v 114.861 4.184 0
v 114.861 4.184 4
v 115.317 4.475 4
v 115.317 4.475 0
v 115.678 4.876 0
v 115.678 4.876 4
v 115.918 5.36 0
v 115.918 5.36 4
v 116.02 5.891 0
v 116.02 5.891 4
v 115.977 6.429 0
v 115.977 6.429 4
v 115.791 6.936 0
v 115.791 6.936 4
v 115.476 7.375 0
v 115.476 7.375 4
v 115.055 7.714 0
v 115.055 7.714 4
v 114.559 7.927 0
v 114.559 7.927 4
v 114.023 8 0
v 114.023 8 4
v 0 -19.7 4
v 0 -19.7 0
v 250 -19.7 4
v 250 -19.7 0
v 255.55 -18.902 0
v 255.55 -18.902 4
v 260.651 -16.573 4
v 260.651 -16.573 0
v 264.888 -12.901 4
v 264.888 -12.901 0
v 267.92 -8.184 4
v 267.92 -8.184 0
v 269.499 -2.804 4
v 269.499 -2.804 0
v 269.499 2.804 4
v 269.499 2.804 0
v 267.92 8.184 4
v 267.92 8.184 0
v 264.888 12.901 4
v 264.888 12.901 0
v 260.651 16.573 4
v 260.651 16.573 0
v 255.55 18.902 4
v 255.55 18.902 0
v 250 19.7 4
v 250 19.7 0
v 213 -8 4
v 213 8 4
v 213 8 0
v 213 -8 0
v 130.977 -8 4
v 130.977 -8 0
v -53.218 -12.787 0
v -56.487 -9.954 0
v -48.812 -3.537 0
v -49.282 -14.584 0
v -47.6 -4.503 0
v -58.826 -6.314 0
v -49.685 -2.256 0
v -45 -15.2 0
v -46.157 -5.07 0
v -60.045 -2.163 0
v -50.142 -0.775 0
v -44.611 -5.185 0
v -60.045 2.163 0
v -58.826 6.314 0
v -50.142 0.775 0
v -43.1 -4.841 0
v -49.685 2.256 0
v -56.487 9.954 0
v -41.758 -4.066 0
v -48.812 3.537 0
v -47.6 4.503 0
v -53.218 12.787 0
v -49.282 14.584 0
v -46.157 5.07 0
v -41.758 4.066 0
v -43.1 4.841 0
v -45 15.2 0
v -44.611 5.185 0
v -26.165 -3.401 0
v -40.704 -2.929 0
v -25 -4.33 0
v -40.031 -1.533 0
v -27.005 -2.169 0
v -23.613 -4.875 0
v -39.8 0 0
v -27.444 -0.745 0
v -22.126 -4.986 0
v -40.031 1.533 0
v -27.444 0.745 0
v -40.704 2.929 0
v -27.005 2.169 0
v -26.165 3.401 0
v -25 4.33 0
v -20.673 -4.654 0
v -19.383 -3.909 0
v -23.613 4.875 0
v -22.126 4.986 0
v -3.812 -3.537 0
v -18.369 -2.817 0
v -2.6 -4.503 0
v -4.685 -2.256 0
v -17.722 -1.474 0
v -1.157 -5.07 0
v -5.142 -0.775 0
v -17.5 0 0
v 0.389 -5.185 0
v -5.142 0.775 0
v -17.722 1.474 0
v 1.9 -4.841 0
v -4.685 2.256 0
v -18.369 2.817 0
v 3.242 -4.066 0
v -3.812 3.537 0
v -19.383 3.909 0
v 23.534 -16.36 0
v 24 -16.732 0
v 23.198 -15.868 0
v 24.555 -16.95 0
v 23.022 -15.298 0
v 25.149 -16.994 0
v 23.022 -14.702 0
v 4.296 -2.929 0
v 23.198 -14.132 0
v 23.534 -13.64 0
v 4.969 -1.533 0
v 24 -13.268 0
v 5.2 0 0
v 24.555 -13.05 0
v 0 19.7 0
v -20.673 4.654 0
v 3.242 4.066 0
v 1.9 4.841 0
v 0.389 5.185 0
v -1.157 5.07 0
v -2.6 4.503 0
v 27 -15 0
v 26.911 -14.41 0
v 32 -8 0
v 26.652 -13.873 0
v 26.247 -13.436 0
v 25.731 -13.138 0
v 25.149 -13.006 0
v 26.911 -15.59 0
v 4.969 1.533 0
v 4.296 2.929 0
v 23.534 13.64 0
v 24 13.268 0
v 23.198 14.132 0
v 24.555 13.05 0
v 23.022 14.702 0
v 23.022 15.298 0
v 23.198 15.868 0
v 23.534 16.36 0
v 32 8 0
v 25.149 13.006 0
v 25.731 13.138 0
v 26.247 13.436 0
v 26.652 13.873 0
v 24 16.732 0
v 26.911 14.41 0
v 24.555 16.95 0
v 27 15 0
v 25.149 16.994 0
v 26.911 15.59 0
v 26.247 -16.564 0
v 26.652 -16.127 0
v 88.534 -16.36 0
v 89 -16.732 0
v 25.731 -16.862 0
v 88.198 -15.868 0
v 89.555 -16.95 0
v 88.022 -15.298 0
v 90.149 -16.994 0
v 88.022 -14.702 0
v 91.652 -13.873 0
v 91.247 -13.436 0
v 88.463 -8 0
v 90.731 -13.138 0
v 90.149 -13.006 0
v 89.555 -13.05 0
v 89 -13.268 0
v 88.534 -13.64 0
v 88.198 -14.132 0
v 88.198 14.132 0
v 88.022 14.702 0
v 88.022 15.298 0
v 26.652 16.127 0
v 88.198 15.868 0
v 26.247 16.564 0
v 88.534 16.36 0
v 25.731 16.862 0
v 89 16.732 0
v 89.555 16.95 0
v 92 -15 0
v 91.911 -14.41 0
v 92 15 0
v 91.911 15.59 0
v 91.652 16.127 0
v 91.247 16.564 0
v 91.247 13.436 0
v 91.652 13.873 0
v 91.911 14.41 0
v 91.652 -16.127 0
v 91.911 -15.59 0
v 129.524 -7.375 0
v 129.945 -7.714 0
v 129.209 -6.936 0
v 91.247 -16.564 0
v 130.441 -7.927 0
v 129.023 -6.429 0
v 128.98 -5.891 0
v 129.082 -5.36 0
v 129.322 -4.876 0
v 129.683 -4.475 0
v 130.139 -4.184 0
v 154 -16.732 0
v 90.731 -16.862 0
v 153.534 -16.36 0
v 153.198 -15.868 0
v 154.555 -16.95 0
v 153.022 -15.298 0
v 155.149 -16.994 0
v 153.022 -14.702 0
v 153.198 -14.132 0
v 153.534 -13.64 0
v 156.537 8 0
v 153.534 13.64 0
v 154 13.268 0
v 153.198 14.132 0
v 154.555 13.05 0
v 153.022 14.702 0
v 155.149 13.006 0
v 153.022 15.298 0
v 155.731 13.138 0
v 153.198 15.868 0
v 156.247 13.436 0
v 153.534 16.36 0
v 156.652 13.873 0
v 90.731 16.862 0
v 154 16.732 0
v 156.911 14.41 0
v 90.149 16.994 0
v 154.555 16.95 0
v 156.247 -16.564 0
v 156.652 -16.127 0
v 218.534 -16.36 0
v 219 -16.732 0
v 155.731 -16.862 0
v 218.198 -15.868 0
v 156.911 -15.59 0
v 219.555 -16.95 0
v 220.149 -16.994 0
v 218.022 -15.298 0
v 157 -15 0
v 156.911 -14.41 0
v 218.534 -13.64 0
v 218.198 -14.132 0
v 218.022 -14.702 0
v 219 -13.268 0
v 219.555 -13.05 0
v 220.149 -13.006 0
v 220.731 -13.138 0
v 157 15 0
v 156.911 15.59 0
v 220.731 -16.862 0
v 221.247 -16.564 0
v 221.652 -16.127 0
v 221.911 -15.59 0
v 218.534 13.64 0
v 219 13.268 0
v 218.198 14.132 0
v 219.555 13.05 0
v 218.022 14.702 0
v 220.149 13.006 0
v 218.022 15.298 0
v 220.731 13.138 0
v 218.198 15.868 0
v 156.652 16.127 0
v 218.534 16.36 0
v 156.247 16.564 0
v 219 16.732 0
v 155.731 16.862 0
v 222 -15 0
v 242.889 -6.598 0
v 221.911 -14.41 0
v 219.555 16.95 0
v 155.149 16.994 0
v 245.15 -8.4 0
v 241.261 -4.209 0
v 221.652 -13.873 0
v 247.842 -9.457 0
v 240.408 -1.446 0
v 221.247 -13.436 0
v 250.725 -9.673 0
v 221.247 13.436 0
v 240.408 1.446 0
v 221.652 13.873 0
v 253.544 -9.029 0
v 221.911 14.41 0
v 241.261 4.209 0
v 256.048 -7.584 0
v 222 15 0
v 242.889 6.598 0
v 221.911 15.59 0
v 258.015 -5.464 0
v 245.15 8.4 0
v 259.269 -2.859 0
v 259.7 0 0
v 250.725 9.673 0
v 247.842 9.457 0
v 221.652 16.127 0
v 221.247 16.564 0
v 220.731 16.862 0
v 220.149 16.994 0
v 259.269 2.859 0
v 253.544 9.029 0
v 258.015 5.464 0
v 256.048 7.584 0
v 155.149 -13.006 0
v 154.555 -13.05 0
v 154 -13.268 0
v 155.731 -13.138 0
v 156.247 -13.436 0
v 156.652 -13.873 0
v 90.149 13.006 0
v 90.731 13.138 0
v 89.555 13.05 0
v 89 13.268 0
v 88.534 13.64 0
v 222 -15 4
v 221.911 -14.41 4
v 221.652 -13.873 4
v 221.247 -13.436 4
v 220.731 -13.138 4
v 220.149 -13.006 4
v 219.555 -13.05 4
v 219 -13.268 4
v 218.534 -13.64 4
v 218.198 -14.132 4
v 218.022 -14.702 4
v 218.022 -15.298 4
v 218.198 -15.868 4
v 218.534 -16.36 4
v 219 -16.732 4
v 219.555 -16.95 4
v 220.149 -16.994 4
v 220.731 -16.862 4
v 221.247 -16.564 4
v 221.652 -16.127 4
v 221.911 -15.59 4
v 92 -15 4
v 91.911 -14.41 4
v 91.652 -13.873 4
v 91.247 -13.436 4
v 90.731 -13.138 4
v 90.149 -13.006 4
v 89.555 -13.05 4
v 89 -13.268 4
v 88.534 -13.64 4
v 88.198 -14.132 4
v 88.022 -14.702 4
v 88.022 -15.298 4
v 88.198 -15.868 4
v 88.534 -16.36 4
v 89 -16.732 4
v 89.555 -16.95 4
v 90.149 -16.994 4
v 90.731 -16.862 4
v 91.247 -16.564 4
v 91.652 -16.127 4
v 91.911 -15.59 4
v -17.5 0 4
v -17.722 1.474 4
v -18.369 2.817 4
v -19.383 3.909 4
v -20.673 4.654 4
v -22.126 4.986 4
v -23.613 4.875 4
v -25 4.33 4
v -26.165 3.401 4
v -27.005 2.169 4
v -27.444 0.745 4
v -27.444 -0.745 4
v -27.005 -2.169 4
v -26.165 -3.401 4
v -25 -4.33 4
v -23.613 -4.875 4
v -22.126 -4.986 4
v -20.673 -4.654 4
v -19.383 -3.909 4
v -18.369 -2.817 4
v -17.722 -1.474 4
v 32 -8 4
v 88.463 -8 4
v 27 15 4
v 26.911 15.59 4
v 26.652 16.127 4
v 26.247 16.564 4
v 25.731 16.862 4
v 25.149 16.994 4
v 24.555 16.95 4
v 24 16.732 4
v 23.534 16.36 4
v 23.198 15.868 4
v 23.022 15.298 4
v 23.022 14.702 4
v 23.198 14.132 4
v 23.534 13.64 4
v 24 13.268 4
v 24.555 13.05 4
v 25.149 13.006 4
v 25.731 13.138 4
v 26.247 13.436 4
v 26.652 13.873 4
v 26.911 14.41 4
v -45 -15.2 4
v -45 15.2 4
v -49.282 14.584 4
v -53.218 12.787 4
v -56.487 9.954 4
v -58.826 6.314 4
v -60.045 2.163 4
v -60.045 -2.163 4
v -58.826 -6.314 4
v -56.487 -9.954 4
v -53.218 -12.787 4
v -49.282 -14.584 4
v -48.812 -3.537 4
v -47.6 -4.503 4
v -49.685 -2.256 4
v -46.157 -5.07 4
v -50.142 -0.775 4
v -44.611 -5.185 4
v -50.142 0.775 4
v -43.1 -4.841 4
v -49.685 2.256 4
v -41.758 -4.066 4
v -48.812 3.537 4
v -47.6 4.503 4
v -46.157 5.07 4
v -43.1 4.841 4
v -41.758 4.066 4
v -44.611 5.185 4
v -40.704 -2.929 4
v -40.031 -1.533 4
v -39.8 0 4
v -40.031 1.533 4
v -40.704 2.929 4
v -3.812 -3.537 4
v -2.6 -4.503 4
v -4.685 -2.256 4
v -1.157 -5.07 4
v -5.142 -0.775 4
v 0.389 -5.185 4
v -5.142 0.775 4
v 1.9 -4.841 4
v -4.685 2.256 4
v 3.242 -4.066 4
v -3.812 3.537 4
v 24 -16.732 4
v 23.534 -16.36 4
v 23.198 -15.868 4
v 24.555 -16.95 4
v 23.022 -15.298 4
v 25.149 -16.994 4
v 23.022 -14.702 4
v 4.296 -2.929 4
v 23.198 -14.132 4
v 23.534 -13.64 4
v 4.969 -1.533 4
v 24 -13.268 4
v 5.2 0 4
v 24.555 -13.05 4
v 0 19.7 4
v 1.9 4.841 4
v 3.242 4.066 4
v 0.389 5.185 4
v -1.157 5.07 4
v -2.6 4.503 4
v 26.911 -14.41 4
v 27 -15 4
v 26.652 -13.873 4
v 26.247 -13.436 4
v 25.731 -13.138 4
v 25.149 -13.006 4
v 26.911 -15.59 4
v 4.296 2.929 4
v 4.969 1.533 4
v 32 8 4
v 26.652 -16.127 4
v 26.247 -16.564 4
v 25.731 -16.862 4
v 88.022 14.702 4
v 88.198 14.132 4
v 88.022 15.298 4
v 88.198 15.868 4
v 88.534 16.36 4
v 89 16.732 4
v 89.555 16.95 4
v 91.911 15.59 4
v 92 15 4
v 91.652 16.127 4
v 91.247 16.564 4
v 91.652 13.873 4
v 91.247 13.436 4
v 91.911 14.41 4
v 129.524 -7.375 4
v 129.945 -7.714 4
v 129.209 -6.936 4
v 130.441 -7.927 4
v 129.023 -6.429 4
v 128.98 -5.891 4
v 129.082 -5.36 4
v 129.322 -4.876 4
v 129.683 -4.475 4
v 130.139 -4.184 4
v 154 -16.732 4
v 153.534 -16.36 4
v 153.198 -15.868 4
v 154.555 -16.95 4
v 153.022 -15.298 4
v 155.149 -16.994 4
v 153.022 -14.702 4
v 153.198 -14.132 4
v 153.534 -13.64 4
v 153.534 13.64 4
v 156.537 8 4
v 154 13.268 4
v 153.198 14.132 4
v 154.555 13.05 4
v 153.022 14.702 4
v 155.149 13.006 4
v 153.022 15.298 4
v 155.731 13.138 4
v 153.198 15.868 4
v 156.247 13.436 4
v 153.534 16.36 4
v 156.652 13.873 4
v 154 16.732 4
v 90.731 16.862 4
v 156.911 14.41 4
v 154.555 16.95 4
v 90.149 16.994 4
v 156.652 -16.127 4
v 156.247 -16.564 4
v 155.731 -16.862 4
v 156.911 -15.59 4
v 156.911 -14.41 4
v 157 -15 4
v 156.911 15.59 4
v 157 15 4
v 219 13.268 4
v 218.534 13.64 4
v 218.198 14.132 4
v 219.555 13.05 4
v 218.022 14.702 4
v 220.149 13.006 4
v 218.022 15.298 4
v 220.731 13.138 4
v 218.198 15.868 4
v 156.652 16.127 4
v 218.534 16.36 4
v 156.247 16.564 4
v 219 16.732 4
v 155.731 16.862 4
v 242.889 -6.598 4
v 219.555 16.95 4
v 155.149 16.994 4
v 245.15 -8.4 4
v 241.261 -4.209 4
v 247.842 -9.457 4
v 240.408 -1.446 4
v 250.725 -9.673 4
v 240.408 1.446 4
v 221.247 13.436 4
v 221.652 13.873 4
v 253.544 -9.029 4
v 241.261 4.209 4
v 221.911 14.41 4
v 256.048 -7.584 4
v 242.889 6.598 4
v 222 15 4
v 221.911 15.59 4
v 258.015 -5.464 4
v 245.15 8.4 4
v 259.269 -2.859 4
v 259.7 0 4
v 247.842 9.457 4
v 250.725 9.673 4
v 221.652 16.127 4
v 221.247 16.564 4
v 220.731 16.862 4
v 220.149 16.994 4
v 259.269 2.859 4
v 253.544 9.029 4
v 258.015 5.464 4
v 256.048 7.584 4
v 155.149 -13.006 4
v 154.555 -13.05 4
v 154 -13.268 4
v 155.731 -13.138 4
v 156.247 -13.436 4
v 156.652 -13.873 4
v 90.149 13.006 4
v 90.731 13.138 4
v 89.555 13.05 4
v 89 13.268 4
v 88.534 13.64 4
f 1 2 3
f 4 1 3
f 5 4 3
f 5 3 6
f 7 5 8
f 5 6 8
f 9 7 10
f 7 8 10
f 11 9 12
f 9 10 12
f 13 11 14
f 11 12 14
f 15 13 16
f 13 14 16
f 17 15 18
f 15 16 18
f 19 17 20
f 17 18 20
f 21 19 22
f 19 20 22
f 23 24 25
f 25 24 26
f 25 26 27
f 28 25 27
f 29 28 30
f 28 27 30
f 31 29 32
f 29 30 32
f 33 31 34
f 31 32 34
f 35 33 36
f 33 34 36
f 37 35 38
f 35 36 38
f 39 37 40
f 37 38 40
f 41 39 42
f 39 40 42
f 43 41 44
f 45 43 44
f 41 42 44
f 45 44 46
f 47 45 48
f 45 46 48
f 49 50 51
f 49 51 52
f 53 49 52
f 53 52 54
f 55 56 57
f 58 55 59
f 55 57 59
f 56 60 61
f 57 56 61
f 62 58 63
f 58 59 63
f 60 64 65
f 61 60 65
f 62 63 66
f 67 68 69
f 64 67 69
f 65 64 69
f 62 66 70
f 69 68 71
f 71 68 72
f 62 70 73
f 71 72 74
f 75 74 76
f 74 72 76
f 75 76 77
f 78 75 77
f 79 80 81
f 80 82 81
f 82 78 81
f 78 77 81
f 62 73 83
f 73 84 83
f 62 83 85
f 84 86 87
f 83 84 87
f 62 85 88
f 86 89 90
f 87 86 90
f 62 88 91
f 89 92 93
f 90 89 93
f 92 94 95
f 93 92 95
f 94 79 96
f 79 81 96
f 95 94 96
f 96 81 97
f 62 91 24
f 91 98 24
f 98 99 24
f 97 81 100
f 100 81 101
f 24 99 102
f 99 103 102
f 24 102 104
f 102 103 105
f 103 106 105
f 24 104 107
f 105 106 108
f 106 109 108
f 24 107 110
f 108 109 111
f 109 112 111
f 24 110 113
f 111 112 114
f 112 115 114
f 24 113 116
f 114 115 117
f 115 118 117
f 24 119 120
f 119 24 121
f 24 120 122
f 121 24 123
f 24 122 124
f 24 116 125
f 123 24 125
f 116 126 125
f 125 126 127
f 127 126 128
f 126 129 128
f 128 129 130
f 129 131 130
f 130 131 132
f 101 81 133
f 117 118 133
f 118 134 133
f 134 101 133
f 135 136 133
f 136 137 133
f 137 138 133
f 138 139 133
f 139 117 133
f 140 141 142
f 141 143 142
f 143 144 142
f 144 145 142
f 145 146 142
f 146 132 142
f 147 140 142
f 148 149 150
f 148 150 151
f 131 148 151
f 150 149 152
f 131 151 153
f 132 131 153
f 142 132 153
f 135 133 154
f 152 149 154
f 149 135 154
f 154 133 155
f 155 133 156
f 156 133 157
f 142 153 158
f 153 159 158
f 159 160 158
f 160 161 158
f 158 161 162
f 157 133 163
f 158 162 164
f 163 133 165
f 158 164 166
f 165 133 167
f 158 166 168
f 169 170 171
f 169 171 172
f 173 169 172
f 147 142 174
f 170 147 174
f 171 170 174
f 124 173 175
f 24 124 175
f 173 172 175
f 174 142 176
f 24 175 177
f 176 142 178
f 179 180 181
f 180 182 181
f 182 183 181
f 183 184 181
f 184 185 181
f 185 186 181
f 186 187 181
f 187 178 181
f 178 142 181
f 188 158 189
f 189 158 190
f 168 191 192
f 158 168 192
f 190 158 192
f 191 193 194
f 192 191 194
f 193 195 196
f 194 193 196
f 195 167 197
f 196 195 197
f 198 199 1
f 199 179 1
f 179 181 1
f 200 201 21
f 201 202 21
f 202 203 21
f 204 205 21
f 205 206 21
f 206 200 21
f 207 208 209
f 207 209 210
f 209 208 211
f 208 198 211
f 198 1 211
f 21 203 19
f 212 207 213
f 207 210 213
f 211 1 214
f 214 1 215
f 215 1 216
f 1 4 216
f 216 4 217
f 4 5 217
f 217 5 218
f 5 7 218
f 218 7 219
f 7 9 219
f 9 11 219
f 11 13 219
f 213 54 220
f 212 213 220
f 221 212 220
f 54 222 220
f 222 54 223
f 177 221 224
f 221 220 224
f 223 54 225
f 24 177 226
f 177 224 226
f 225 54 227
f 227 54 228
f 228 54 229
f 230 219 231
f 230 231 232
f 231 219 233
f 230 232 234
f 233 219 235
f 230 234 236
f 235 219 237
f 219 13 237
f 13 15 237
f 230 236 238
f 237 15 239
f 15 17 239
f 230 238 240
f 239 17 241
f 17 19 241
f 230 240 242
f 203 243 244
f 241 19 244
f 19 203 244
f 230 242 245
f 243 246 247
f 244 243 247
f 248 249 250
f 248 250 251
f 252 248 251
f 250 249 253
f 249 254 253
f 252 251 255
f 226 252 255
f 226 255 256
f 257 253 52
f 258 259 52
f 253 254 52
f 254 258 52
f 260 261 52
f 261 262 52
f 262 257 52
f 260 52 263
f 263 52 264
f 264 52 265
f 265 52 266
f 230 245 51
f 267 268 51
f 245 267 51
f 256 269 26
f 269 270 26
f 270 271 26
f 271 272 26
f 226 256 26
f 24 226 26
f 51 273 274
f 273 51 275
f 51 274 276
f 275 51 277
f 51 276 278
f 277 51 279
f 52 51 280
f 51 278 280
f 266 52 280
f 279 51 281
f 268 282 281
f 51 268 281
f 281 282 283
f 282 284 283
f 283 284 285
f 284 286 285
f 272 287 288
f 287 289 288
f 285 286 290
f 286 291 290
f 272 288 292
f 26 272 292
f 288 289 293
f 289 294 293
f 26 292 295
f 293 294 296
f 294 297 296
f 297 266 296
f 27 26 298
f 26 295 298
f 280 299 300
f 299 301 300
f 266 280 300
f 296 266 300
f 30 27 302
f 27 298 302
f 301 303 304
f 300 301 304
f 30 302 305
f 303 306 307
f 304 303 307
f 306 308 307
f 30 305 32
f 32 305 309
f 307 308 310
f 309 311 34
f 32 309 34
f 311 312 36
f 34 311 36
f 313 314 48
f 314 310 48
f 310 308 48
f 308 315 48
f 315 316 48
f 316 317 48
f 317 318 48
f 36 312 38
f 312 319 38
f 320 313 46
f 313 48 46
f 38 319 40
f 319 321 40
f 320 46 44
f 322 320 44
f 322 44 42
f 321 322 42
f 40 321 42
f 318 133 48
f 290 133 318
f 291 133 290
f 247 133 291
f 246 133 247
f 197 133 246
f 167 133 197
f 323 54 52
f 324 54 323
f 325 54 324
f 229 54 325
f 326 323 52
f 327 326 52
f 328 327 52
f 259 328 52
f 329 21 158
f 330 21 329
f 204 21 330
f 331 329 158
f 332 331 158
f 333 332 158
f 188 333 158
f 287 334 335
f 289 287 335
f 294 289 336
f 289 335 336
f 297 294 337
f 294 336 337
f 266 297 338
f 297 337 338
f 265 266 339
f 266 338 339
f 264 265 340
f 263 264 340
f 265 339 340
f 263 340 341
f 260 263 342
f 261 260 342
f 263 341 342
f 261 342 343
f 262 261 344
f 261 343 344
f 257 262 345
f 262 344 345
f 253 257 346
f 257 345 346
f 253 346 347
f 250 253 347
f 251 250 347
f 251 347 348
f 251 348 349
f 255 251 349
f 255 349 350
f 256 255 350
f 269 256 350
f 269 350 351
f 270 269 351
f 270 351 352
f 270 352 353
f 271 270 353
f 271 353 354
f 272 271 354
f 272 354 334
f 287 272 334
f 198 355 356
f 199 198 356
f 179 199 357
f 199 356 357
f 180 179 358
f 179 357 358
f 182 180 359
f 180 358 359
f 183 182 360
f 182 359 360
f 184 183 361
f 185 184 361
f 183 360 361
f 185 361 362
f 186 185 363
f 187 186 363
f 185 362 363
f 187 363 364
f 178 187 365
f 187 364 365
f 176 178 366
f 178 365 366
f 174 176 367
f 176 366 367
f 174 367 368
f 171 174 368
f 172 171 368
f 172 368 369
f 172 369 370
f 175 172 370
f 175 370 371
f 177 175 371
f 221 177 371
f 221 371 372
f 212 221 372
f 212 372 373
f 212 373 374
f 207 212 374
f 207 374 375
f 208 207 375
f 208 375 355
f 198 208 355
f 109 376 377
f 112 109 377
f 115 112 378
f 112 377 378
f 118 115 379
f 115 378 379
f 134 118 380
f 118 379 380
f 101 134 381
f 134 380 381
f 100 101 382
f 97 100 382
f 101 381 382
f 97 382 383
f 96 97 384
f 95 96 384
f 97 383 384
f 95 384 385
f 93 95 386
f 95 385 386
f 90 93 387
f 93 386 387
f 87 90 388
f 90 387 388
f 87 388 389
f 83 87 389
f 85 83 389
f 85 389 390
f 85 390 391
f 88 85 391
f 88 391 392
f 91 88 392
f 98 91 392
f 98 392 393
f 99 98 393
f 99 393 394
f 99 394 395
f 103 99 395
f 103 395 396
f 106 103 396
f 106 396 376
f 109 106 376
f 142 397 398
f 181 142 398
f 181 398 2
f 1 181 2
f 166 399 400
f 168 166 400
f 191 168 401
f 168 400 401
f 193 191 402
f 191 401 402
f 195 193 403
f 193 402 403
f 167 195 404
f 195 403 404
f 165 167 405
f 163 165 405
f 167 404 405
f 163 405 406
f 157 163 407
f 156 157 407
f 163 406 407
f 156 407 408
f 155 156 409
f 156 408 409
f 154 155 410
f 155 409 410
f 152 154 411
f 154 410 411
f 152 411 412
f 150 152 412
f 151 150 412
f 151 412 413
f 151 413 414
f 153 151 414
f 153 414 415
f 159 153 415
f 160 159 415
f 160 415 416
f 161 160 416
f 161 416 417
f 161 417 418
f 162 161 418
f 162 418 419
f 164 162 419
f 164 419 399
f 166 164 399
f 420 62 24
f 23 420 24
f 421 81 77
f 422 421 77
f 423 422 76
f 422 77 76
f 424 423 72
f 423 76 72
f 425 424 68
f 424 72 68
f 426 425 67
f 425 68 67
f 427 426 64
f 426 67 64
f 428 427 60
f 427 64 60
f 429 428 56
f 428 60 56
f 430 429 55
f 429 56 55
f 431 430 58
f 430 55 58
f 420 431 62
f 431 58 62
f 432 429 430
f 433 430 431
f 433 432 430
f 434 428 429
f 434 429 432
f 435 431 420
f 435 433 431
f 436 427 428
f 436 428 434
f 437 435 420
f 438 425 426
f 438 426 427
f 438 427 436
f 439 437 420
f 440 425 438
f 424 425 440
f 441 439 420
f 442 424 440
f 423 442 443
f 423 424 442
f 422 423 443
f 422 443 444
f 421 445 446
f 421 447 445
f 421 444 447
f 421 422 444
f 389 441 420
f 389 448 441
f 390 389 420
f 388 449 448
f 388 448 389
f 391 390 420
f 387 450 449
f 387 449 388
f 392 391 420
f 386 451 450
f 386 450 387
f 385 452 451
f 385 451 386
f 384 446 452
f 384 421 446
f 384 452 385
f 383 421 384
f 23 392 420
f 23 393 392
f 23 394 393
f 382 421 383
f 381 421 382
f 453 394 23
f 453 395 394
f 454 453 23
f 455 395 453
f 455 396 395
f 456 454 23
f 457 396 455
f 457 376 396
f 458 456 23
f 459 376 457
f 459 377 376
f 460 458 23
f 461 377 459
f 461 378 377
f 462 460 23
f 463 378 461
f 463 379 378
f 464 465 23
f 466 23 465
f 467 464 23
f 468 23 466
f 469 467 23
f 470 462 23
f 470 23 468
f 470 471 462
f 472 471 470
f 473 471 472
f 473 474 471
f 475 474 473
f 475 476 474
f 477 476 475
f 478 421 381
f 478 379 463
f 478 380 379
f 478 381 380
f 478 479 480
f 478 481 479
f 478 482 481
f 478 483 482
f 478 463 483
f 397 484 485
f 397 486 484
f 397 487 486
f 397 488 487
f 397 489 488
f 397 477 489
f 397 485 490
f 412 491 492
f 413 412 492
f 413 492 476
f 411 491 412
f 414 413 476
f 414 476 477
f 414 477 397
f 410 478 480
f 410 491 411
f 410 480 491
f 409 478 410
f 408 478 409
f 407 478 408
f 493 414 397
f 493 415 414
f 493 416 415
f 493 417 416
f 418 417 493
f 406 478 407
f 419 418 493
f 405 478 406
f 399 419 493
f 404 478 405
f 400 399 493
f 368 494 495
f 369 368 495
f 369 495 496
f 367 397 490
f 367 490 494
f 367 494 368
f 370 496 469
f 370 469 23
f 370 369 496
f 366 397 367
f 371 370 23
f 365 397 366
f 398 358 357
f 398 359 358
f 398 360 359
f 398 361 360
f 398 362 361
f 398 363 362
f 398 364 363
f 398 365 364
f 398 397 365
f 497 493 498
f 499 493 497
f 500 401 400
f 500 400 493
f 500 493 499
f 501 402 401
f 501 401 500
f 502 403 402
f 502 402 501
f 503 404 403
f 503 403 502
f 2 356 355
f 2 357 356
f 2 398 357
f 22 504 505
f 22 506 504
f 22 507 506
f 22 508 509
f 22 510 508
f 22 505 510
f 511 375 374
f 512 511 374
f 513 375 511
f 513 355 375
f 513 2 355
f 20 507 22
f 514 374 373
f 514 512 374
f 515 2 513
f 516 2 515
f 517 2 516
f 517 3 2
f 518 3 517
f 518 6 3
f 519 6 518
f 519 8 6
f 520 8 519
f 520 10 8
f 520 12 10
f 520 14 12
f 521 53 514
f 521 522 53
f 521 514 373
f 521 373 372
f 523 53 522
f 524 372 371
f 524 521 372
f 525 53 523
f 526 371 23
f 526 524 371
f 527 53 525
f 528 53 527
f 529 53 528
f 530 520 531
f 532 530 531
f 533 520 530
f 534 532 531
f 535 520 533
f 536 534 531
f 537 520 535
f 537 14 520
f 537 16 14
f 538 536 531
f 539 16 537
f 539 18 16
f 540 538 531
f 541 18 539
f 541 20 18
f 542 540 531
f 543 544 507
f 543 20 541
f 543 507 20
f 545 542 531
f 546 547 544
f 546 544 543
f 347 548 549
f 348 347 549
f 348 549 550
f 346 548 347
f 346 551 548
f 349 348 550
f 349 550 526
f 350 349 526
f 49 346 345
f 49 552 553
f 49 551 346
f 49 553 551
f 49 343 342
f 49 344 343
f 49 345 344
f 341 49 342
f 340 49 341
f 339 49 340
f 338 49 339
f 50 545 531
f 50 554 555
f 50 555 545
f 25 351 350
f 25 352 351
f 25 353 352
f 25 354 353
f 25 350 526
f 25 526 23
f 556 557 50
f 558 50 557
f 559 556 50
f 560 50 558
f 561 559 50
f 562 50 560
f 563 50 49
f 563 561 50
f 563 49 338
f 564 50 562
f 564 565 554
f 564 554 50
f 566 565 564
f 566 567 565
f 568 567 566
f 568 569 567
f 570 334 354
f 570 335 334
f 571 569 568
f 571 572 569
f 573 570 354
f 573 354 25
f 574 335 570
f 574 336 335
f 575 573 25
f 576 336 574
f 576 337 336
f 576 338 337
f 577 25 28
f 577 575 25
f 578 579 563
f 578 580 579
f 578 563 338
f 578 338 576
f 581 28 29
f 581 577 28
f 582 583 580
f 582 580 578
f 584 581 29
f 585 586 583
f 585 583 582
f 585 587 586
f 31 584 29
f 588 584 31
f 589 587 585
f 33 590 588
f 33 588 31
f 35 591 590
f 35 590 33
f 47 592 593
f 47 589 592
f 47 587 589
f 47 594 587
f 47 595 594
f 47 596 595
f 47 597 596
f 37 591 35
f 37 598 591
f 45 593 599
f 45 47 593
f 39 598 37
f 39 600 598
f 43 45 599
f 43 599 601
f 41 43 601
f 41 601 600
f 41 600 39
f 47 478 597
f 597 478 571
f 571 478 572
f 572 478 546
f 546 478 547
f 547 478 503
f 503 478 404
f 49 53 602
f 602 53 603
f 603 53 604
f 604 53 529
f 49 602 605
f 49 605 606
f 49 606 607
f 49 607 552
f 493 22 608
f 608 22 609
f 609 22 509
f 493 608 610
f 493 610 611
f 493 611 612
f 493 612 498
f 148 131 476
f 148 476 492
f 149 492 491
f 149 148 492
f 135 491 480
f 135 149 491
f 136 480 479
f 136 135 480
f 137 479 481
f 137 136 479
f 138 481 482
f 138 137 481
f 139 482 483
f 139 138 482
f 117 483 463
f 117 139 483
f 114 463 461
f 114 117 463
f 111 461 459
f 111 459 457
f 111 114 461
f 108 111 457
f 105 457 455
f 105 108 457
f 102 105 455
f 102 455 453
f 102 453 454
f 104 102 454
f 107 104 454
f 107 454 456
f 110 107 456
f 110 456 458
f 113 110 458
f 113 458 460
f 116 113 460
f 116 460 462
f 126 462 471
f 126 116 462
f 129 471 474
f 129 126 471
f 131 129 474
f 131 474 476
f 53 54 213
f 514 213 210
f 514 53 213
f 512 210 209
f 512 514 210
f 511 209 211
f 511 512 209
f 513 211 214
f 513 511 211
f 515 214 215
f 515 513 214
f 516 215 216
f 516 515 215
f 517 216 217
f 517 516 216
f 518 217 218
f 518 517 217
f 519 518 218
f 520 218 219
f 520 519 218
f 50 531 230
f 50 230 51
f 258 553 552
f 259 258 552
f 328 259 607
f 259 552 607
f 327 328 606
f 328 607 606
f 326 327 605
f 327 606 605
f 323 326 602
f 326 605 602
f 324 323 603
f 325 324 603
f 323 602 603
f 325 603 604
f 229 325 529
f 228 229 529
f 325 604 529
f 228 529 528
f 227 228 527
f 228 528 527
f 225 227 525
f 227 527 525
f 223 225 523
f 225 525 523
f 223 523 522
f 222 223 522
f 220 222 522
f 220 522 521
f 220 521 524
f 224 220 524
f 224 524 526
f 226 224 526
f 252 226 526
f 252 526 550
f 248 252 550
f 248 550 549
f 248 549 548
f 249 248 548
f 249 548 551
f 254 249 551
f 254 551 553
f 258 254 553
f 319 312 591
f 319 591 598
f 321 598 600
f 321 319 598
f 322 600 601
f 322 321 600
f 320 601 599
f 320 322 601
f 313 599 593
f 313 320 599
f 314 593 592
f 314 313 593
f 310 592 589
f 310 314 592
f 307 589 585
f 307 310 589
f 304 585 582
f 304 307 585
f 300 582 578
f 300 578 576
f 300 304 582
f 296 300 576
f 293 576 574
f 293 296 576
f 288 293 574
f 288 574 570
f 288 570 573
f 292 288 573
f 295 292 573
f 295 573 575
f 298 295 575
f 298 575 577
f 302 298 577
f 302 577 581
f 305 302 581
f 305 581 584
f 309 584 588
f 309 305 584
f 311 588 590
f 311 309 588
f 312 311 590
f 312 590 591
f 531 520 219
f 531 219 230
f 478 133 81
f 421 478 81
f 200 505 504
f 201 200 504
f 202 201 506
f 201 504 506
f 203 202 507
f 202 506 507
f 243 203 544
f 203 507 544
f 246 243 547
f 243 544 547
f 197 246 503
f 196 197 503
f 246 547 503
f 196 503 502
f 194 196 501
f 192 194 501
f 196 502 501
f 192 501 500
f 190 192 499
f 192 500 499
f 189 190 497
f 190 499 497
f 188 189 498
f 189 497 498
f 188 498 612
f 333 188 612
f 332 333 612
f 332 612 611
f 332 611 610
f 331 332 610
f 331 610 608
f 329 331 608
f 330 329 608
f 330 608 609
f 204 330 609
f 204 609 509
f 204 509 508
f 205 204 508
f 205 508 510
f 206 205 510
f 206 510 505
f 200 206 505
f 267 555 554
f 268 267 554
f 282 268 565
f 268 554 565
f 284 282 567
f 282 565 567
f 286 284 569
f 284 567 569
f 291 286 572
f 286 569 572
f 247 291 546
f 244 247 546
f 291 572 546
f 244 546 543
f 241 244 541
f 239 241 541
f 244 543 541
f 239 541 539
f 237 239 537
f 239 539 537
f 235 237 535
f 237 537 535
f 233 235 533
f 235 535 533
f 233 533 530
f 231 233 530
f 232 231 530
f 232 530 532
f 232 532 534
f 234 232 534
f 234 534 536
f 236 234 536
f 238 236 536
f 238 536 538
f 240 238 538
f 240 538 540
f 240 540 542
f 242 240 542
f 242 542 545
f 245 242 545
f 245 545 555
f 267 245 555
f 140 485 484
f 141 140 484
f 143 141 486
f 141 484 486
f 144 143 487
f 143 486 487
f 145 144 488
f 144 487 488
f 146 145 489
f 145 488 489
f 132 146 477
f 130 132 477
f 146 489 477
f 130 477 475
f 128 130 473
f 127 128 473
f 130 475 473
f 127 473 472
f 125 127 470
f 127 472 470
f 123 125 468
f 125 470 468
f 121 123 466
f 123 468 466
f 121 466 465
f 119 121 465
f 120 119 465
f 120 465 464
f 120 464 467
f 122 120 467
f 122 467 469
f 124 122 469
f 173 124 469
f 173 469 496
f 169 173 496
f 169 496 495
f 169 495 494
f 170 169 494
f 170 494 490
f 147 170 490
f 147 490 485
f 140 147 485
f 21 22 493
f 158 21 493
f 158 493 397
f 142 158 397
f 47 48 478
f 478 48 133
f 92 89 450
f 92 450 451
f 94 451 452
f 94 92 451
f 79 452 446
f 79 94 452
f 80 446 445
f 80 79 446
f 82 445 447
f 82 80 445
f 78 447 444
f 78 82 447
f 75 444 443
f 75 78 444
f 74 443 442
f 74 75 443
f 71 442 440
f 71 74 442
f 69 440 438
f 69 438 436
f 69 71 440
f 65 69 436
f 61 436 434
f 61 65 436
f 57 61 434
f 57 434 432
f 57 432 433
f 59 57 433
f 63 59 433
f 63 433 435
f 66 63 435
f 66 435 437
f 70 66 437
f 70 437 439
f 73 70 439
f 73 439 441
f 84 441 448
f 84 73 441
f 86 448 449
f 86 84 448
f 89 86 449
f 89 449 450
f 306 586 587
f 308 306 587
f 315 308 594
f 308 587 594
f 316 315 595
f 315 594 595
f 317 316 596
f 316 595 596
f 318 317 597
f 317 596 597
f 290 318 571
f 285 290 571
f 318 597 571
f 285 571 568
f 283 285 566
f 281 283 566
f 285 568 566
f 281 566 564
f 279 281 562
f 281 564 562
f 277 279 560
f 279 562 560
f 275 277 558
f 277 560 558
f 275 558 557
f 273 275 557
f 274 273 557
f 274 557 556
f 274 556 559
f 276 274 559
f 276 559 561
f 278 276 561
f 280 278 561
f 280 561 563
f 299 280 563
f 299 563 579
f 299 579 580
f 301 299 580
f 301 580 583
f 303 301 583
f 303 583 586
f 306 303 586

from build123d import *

# Parameters (mm, degrees)
SKETCH_1_R          = 5.2
SKETCH_1_R_2        = 9.7
EXTRUDE_1_DEPTH     = 4
SKETCH_2_R          = 2
CUT_EXTRUDE_1_DEPTH = 10
SKETCH_3_R          = 5
CUT_EXTRUDE_2_DEPTH = 10


with BuildPart() as part:
    # 草图1 → 凸台-拉伸1 (new body)
    with BuildSketch(Plane.XY):
        with BuildLine():
            Line((250, 19.7), (0, 19.7))
            Line((0, 19.7), (-45, 15.2))
            ThreePointArc((-45, 15.2), (-60.2, 0), (-45, -15.2))
            Line((-45, -15.2), (0, -19.7))
            Line((0, -19.7), (250, -19.7))
            ThreePointArc((250, -19.7), (269.7, 0), (250, 19.7))
        make_face()
        Circle(SKETCH_1_R, mode=Mode.SUBTRACT)
        with Locations((250, 0)):
            Circle(SKETCH_1_R_2, mode=Mode.SUBTRACT)
        with Locations((-45, 0)):
            Circle(SKETCH_1_R, mode=Mode.SUBTRACT)
    extrude(amount=EXTRUDE_1_DEPTH)

    # 草图2 → 切除-拉伸1 (cut)
    with BuildSketch(Plane.XY.offset(4)):
        with Locations((25, 15)):
            Circle(SKETCH_2_R)
        with Locations((90, 15)):
            Circle(SKETCH_2_R)
        with Locations((155, 15)):
            Circle(SKETCH_2_R)
        with Locations((220, 15)):
            Circle(SKETCH_2_R)
        with Locations((90, -15)):
            Circle(SKETCH_2_R)
        with Locations((155, -15)):
            Circle(SKETCH_2_R)
        with Locations((220, -15)):
            Circle(SKETCH_2_R)
        with Locations((25, -15)):
            Circle(SKETCH_2_R)
    extrude(amount=-CUT_EXTRUDE_1_DEPTH, mode=Mode.SUBTRACT)

    # 草图3 → 切除-拉伸2 (cut)
    with BuildSketch(Plane.XY.offset(4)):
        with Locations((-22.5, 0)):
            Circle(SKETCH_3_R)
        with BuildLine():
            Line((32, 8), (32, -8))
            Line((32, -8), (88.462542093, -8))
            Line((88.462542093, -8), (114.86138476, 4.184081231))
            ThreePointArc((114.86138476, 4.184081231), (115.976706085, 6.429046887), (114.023268405, 8))
            Line((114.023268405, 8), (32, 8))
        make_face()
        with BuildLine():
            Line((156.537457907, 8), (213, 8))
            Line((213, 8), (213, -8))
            Line((213, -8), (130.976731595, -8))
            ThreePointArc((130.976731595, -8), (129.023293915, -6.429046887), (130.13861524, -4.184081231))
            Line((130.13861524, -4.184081231), (156.537457907, 8))
        make_face()
    extrude(amount=-CUT_EXTRUDE_2_DEPTH, mode=Mode.SUBTRACT)


solid = part.part
